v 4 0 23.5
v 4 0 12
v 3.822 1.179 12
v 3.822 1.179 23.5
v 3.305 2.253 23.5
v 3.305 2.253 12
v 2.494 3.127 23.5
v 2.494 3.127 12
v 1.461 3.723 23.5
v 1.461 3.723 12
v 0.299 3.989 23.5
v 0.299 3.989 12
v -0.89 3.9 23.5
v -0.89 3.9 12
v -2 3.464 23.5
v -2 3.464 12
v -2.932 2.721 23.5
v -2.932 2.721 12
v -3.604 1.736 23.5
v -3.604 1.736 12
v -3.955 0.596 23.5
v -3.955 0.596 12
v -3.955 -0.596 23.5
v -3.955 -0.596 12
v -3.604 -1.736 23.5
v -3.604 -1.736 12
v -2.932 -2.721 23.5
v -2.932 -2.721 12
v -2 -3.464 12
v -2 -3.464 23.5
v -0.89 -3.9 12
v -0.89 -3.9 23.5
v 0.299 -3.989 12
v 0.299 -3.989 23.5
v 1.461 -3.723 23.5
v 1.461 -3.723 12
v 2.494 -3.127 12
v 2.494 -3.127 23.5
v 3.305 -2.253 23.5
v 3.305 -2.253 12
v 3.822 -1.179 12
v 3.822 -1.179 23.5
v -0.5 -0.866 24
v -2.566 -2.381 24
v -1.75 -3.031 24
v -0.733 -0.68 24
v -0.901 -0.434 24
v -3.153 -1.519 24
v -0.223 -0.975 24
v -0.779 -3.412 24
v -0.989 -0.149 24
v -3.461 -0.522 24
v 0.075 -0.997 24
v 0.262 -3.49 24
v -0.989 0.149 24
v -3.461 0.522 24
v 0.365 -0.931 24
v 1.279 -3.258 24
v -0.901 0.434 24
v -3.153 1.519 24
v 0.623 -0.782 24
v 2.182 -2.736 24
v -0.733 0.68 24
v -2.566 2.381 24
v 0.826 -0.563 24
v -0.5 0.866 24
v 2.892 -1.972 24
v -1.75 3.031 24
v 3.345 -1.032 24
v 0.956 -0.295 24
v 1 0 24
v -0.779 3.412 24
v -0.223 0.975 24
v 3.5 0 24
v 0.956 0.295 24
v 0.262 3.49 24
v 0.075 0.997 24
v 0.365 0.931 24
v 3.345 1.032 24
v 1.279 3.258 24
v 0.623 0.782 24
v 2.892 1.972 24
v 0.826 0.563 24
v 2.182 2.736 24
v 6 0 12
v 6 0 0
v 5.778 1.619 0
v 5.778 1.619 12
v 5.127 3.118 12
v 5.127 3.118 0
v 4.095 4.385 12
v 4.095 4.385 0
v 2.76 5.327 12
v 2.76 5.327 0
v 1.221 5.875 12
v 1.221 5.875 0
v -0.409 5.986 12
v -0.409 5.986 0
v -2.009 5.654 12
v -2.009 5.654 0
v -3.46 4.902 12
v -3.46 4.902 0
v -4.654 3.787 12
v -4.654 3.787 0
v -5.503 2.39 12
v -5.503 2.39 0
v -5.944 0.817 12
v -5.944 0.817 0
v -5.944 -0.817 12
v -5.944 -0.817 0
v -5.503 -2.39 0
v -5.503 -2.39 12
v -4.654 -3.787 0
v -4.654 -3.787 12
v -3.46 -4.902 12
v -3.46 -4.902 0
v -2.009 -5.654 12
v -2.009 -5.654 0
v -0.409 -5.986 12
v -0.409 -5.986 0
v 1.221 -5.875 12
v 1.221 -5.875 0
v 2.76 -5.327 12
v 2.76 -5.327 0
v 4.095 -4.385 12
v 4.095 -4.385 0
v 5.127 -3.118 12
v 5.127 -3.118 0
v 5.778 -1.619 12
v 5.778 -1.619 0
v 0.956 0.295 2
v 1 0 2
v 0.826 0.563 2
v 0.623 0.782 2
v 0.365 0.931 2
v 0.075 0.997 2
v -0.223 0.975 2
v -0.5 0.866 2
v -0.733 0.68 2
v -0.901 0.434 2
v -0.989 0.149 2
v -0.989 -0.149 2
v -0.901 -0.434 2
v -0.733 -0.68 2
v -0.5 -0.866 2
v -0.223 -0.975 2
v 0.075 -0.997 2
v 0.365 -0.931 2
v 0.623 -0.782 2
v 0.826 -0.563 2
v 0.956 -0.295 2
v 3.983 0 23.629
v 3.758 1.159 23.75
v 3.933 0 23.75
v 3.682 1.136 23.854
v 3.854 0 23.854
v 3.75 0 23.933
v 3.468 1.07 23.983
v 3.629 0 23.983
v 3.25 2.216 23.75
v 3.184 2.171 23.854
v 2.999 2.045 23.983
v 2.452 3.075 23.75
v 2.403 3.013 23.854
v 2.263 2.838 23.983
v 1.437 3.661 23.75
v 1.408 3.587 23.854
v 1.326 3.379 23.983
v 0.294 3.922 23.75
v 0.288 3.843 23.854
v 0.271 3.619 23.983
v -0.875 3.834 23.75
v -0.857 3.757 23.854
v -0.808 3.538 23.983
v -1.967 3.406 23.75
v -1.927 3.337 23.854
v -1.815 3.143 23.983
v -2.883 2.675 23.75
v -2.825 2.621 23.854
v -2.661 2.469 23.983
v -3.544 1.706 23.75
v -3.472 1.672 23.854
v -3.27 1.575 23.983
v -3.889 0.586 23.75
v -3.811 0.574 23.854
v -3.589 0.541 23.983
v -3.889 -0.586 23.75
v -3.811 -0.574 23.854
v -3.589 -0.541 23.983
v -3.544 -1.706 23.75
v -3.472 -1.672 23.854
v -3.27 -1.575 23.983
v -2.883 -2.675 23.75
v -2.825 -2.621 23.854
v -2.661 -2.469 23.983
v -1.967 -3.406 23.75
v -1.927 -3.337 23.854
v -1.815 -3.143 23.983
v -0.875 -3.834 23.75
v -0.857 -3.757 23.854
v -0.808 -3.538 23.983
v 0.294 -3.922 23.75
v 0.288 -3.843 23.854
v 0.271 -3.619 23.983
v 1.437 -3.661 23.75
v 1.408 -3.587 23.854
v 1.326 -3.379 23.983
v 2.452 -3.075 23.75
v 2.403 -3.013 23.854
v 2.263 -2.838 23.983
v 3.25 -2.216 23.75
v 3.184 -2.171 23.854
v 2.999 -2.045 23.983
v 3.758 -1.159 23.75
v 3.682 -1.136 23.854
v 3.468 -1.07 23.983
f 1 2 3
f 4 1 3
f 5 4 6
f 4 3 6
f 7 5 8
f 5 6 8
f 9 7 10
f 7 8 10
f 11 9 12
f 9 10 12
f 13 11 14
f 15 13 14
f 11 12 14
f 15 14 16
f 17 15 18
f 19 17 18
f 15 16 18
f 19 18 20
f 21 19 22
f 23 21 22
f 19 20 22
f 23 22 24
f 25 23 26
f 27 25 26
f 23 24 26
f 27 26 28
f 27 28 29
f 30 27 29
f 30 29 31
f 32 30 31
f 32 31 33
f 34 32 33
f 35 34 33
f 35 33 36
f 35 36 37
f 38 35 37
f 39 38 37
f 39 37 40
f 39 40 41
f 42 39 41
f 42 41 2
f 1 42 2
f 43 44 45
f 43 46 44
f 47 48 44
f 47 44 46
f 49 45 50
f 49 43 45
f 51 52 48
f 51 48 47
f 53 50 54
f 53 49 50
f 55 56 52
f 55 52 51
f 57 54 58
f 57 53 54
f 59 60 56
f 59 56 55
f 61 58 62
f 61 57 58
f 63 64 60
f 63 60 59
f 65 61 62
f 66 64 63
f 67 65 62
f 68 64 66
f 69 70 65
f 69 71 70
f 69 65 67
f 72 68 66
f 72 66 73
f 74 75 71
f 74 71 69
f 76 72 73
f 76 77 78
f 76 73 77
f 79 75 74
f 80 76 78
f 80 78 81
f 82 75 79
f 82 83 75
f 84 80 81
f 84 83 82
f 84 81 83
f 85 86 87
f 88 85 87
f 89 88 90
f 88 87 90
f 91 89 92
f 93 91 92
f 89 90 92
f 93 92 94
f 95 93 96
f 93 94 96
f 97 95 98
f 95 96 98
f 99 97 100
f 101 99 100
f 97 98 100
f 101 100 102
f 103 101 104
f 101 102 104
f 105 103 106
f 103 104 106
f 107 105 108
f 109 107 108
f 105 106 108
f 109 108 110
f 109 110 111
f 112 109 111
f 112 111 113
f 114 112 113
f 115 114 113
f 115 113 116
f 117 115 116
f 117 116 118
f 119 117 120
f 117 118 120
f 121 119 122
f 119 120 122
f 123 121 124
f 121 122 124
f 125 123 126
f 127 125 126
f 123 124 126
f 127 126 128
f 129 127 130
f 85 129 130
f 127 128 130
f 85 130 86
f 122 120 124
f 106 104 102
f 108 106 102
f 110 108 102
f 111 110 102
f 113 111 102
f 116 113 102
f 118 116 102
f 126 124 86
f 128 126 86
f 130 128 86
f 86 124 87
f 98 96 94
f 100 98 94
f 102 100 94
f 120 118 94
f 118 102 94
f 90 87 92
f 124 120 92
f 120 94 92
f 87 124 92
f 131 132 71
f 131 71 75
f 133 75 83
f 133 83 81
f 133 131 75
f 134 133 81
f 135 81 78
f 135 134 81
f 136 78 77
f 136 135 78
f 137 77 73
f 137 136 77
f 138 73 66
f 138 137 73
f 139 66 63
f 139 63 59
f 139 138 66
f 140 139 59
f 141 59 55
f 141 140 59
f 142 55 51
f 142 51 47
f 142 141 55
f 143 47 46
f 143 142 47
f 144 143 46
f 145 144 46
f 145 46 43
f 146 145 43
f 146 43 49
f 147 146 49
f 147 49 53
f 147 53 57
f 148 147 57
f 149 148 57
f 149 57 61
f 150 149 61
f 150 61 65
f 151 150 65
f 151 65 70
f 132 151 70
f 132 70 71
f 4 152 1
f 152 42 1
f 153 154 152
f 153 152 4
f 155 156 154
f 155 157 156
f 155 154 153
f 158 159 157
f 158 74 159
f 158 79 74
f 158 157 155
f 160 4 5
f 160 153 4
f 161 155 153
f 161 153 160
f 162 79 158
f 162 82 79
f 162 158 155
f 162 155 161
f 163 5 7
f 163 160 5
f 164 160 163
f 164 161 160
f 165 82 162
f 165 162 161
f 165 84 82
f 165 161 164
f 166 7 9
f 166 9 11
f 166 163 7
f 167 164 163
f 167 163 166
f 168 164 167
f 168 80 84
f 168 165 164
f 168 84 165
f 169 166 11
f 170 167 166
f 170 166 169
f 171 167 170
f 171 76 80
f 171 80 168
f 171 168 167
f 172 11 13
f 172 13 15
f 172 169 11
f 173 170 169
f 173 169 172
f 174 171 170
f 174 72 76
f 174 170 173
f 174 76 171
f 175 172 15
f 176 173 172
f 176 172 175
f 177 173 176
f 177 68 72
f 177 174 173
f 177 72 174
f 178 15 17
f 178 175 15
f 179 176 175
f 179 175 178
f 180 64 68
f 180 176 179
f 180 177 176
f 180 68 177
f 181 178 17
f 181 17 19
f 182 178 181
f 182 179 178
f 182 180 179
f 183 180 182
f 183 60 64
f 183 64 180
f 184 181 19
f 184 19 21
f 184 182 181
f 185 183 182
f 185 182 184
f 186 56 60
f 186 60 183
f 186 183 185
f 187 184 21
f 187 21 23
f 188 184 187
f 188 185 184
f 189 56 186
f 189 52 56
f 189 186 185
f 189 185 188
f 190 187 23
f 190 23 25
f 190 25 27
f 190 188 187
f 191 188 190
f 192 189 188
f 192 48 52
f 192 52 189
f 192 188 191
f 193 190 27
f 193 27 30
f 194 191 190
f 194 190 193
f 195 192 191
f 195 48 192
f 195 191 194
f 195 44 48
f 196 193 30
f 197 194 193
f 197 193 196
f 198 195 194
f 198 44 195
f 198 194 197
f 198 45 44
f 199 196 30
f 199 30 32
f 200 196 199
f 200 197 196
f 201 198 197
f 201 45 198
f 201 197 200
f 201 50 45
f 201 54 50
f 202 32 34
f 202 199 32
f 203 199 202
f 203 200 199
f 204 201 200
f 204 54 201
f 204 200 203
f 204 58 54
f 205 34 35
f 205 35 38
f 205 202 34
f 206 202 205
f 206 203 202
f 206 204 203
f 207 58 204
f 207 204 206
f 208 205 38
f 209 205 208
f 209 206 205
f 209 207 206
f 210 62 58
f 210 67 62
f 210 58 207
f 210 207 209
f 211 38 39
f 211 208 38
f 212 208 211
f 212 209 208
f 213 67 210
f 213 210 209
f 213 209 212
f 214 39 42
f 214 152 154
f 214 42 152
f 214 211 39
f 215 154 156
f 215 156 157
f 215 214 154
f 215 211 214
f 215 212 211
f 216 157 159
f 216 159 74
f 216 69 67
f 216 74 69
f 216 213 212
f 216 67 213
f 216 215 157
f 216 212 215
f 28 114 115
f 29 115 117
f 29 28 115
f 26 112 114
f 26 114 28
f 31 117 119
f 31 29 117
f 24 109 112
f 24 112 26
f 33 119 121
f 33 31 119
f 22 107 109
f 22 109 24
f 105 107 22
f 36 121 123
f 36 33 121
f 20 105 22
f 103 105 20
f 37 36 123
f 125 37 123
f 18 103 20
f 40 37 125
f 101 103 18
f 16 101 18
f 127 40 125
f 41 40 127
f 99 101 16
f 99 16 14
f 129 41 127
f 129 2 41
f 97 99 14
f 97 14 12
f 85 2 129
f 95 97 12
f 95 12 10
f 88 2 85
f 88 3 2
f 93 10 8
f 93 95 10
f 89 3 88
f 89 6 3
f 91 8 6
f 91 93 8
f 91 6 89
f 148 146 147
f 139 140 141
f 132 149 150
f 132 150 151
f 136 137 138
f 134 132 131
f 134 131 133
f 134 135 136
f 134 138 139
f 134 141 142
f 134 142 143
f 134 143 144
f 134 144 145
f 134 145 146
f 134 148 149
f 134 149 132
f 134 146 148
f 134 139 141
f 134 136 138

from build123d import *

# Parameters (mm, degrees)
F0_R     = 1
F1_DEPTH = 2
F0_R_2   = 4
F2_DEPTH = 24
F0_R_3   = 6
F3_DEPTH = 12
F4_R     = 0.5


with BuildPart() as f1:
    # F0 (on Top) → F1 (new body)
    with BuildSketch(Plane.XY):
        Circle(F0_R)
    extrude(amount=F1_DEPTH)

    # F0 (on Top) → F2 (join)
    with BuildSketch(Plane.XY):
        Circle(F0_R_2)
        Circle(F0_R, mode=Mode.SUBTRACT)
    extrude(amount=F2_DEPTH)

    # F0 (on Top) → F3 (join)
    with BuildSketch(Plane.XY):
        Circle(F0_R_3)
        Circle(F0_R_2, mode=Mode.SUBTRACT)
    extrude(amount=F3_DEPTH)

    # F4
    f4_edges = [f1.edges().sort_by_distance(p)[0] for p in [
        (-4, 0, 24),
    ]]
    fillet(f4_edges, radius=F4_R)


solid = f1.part
